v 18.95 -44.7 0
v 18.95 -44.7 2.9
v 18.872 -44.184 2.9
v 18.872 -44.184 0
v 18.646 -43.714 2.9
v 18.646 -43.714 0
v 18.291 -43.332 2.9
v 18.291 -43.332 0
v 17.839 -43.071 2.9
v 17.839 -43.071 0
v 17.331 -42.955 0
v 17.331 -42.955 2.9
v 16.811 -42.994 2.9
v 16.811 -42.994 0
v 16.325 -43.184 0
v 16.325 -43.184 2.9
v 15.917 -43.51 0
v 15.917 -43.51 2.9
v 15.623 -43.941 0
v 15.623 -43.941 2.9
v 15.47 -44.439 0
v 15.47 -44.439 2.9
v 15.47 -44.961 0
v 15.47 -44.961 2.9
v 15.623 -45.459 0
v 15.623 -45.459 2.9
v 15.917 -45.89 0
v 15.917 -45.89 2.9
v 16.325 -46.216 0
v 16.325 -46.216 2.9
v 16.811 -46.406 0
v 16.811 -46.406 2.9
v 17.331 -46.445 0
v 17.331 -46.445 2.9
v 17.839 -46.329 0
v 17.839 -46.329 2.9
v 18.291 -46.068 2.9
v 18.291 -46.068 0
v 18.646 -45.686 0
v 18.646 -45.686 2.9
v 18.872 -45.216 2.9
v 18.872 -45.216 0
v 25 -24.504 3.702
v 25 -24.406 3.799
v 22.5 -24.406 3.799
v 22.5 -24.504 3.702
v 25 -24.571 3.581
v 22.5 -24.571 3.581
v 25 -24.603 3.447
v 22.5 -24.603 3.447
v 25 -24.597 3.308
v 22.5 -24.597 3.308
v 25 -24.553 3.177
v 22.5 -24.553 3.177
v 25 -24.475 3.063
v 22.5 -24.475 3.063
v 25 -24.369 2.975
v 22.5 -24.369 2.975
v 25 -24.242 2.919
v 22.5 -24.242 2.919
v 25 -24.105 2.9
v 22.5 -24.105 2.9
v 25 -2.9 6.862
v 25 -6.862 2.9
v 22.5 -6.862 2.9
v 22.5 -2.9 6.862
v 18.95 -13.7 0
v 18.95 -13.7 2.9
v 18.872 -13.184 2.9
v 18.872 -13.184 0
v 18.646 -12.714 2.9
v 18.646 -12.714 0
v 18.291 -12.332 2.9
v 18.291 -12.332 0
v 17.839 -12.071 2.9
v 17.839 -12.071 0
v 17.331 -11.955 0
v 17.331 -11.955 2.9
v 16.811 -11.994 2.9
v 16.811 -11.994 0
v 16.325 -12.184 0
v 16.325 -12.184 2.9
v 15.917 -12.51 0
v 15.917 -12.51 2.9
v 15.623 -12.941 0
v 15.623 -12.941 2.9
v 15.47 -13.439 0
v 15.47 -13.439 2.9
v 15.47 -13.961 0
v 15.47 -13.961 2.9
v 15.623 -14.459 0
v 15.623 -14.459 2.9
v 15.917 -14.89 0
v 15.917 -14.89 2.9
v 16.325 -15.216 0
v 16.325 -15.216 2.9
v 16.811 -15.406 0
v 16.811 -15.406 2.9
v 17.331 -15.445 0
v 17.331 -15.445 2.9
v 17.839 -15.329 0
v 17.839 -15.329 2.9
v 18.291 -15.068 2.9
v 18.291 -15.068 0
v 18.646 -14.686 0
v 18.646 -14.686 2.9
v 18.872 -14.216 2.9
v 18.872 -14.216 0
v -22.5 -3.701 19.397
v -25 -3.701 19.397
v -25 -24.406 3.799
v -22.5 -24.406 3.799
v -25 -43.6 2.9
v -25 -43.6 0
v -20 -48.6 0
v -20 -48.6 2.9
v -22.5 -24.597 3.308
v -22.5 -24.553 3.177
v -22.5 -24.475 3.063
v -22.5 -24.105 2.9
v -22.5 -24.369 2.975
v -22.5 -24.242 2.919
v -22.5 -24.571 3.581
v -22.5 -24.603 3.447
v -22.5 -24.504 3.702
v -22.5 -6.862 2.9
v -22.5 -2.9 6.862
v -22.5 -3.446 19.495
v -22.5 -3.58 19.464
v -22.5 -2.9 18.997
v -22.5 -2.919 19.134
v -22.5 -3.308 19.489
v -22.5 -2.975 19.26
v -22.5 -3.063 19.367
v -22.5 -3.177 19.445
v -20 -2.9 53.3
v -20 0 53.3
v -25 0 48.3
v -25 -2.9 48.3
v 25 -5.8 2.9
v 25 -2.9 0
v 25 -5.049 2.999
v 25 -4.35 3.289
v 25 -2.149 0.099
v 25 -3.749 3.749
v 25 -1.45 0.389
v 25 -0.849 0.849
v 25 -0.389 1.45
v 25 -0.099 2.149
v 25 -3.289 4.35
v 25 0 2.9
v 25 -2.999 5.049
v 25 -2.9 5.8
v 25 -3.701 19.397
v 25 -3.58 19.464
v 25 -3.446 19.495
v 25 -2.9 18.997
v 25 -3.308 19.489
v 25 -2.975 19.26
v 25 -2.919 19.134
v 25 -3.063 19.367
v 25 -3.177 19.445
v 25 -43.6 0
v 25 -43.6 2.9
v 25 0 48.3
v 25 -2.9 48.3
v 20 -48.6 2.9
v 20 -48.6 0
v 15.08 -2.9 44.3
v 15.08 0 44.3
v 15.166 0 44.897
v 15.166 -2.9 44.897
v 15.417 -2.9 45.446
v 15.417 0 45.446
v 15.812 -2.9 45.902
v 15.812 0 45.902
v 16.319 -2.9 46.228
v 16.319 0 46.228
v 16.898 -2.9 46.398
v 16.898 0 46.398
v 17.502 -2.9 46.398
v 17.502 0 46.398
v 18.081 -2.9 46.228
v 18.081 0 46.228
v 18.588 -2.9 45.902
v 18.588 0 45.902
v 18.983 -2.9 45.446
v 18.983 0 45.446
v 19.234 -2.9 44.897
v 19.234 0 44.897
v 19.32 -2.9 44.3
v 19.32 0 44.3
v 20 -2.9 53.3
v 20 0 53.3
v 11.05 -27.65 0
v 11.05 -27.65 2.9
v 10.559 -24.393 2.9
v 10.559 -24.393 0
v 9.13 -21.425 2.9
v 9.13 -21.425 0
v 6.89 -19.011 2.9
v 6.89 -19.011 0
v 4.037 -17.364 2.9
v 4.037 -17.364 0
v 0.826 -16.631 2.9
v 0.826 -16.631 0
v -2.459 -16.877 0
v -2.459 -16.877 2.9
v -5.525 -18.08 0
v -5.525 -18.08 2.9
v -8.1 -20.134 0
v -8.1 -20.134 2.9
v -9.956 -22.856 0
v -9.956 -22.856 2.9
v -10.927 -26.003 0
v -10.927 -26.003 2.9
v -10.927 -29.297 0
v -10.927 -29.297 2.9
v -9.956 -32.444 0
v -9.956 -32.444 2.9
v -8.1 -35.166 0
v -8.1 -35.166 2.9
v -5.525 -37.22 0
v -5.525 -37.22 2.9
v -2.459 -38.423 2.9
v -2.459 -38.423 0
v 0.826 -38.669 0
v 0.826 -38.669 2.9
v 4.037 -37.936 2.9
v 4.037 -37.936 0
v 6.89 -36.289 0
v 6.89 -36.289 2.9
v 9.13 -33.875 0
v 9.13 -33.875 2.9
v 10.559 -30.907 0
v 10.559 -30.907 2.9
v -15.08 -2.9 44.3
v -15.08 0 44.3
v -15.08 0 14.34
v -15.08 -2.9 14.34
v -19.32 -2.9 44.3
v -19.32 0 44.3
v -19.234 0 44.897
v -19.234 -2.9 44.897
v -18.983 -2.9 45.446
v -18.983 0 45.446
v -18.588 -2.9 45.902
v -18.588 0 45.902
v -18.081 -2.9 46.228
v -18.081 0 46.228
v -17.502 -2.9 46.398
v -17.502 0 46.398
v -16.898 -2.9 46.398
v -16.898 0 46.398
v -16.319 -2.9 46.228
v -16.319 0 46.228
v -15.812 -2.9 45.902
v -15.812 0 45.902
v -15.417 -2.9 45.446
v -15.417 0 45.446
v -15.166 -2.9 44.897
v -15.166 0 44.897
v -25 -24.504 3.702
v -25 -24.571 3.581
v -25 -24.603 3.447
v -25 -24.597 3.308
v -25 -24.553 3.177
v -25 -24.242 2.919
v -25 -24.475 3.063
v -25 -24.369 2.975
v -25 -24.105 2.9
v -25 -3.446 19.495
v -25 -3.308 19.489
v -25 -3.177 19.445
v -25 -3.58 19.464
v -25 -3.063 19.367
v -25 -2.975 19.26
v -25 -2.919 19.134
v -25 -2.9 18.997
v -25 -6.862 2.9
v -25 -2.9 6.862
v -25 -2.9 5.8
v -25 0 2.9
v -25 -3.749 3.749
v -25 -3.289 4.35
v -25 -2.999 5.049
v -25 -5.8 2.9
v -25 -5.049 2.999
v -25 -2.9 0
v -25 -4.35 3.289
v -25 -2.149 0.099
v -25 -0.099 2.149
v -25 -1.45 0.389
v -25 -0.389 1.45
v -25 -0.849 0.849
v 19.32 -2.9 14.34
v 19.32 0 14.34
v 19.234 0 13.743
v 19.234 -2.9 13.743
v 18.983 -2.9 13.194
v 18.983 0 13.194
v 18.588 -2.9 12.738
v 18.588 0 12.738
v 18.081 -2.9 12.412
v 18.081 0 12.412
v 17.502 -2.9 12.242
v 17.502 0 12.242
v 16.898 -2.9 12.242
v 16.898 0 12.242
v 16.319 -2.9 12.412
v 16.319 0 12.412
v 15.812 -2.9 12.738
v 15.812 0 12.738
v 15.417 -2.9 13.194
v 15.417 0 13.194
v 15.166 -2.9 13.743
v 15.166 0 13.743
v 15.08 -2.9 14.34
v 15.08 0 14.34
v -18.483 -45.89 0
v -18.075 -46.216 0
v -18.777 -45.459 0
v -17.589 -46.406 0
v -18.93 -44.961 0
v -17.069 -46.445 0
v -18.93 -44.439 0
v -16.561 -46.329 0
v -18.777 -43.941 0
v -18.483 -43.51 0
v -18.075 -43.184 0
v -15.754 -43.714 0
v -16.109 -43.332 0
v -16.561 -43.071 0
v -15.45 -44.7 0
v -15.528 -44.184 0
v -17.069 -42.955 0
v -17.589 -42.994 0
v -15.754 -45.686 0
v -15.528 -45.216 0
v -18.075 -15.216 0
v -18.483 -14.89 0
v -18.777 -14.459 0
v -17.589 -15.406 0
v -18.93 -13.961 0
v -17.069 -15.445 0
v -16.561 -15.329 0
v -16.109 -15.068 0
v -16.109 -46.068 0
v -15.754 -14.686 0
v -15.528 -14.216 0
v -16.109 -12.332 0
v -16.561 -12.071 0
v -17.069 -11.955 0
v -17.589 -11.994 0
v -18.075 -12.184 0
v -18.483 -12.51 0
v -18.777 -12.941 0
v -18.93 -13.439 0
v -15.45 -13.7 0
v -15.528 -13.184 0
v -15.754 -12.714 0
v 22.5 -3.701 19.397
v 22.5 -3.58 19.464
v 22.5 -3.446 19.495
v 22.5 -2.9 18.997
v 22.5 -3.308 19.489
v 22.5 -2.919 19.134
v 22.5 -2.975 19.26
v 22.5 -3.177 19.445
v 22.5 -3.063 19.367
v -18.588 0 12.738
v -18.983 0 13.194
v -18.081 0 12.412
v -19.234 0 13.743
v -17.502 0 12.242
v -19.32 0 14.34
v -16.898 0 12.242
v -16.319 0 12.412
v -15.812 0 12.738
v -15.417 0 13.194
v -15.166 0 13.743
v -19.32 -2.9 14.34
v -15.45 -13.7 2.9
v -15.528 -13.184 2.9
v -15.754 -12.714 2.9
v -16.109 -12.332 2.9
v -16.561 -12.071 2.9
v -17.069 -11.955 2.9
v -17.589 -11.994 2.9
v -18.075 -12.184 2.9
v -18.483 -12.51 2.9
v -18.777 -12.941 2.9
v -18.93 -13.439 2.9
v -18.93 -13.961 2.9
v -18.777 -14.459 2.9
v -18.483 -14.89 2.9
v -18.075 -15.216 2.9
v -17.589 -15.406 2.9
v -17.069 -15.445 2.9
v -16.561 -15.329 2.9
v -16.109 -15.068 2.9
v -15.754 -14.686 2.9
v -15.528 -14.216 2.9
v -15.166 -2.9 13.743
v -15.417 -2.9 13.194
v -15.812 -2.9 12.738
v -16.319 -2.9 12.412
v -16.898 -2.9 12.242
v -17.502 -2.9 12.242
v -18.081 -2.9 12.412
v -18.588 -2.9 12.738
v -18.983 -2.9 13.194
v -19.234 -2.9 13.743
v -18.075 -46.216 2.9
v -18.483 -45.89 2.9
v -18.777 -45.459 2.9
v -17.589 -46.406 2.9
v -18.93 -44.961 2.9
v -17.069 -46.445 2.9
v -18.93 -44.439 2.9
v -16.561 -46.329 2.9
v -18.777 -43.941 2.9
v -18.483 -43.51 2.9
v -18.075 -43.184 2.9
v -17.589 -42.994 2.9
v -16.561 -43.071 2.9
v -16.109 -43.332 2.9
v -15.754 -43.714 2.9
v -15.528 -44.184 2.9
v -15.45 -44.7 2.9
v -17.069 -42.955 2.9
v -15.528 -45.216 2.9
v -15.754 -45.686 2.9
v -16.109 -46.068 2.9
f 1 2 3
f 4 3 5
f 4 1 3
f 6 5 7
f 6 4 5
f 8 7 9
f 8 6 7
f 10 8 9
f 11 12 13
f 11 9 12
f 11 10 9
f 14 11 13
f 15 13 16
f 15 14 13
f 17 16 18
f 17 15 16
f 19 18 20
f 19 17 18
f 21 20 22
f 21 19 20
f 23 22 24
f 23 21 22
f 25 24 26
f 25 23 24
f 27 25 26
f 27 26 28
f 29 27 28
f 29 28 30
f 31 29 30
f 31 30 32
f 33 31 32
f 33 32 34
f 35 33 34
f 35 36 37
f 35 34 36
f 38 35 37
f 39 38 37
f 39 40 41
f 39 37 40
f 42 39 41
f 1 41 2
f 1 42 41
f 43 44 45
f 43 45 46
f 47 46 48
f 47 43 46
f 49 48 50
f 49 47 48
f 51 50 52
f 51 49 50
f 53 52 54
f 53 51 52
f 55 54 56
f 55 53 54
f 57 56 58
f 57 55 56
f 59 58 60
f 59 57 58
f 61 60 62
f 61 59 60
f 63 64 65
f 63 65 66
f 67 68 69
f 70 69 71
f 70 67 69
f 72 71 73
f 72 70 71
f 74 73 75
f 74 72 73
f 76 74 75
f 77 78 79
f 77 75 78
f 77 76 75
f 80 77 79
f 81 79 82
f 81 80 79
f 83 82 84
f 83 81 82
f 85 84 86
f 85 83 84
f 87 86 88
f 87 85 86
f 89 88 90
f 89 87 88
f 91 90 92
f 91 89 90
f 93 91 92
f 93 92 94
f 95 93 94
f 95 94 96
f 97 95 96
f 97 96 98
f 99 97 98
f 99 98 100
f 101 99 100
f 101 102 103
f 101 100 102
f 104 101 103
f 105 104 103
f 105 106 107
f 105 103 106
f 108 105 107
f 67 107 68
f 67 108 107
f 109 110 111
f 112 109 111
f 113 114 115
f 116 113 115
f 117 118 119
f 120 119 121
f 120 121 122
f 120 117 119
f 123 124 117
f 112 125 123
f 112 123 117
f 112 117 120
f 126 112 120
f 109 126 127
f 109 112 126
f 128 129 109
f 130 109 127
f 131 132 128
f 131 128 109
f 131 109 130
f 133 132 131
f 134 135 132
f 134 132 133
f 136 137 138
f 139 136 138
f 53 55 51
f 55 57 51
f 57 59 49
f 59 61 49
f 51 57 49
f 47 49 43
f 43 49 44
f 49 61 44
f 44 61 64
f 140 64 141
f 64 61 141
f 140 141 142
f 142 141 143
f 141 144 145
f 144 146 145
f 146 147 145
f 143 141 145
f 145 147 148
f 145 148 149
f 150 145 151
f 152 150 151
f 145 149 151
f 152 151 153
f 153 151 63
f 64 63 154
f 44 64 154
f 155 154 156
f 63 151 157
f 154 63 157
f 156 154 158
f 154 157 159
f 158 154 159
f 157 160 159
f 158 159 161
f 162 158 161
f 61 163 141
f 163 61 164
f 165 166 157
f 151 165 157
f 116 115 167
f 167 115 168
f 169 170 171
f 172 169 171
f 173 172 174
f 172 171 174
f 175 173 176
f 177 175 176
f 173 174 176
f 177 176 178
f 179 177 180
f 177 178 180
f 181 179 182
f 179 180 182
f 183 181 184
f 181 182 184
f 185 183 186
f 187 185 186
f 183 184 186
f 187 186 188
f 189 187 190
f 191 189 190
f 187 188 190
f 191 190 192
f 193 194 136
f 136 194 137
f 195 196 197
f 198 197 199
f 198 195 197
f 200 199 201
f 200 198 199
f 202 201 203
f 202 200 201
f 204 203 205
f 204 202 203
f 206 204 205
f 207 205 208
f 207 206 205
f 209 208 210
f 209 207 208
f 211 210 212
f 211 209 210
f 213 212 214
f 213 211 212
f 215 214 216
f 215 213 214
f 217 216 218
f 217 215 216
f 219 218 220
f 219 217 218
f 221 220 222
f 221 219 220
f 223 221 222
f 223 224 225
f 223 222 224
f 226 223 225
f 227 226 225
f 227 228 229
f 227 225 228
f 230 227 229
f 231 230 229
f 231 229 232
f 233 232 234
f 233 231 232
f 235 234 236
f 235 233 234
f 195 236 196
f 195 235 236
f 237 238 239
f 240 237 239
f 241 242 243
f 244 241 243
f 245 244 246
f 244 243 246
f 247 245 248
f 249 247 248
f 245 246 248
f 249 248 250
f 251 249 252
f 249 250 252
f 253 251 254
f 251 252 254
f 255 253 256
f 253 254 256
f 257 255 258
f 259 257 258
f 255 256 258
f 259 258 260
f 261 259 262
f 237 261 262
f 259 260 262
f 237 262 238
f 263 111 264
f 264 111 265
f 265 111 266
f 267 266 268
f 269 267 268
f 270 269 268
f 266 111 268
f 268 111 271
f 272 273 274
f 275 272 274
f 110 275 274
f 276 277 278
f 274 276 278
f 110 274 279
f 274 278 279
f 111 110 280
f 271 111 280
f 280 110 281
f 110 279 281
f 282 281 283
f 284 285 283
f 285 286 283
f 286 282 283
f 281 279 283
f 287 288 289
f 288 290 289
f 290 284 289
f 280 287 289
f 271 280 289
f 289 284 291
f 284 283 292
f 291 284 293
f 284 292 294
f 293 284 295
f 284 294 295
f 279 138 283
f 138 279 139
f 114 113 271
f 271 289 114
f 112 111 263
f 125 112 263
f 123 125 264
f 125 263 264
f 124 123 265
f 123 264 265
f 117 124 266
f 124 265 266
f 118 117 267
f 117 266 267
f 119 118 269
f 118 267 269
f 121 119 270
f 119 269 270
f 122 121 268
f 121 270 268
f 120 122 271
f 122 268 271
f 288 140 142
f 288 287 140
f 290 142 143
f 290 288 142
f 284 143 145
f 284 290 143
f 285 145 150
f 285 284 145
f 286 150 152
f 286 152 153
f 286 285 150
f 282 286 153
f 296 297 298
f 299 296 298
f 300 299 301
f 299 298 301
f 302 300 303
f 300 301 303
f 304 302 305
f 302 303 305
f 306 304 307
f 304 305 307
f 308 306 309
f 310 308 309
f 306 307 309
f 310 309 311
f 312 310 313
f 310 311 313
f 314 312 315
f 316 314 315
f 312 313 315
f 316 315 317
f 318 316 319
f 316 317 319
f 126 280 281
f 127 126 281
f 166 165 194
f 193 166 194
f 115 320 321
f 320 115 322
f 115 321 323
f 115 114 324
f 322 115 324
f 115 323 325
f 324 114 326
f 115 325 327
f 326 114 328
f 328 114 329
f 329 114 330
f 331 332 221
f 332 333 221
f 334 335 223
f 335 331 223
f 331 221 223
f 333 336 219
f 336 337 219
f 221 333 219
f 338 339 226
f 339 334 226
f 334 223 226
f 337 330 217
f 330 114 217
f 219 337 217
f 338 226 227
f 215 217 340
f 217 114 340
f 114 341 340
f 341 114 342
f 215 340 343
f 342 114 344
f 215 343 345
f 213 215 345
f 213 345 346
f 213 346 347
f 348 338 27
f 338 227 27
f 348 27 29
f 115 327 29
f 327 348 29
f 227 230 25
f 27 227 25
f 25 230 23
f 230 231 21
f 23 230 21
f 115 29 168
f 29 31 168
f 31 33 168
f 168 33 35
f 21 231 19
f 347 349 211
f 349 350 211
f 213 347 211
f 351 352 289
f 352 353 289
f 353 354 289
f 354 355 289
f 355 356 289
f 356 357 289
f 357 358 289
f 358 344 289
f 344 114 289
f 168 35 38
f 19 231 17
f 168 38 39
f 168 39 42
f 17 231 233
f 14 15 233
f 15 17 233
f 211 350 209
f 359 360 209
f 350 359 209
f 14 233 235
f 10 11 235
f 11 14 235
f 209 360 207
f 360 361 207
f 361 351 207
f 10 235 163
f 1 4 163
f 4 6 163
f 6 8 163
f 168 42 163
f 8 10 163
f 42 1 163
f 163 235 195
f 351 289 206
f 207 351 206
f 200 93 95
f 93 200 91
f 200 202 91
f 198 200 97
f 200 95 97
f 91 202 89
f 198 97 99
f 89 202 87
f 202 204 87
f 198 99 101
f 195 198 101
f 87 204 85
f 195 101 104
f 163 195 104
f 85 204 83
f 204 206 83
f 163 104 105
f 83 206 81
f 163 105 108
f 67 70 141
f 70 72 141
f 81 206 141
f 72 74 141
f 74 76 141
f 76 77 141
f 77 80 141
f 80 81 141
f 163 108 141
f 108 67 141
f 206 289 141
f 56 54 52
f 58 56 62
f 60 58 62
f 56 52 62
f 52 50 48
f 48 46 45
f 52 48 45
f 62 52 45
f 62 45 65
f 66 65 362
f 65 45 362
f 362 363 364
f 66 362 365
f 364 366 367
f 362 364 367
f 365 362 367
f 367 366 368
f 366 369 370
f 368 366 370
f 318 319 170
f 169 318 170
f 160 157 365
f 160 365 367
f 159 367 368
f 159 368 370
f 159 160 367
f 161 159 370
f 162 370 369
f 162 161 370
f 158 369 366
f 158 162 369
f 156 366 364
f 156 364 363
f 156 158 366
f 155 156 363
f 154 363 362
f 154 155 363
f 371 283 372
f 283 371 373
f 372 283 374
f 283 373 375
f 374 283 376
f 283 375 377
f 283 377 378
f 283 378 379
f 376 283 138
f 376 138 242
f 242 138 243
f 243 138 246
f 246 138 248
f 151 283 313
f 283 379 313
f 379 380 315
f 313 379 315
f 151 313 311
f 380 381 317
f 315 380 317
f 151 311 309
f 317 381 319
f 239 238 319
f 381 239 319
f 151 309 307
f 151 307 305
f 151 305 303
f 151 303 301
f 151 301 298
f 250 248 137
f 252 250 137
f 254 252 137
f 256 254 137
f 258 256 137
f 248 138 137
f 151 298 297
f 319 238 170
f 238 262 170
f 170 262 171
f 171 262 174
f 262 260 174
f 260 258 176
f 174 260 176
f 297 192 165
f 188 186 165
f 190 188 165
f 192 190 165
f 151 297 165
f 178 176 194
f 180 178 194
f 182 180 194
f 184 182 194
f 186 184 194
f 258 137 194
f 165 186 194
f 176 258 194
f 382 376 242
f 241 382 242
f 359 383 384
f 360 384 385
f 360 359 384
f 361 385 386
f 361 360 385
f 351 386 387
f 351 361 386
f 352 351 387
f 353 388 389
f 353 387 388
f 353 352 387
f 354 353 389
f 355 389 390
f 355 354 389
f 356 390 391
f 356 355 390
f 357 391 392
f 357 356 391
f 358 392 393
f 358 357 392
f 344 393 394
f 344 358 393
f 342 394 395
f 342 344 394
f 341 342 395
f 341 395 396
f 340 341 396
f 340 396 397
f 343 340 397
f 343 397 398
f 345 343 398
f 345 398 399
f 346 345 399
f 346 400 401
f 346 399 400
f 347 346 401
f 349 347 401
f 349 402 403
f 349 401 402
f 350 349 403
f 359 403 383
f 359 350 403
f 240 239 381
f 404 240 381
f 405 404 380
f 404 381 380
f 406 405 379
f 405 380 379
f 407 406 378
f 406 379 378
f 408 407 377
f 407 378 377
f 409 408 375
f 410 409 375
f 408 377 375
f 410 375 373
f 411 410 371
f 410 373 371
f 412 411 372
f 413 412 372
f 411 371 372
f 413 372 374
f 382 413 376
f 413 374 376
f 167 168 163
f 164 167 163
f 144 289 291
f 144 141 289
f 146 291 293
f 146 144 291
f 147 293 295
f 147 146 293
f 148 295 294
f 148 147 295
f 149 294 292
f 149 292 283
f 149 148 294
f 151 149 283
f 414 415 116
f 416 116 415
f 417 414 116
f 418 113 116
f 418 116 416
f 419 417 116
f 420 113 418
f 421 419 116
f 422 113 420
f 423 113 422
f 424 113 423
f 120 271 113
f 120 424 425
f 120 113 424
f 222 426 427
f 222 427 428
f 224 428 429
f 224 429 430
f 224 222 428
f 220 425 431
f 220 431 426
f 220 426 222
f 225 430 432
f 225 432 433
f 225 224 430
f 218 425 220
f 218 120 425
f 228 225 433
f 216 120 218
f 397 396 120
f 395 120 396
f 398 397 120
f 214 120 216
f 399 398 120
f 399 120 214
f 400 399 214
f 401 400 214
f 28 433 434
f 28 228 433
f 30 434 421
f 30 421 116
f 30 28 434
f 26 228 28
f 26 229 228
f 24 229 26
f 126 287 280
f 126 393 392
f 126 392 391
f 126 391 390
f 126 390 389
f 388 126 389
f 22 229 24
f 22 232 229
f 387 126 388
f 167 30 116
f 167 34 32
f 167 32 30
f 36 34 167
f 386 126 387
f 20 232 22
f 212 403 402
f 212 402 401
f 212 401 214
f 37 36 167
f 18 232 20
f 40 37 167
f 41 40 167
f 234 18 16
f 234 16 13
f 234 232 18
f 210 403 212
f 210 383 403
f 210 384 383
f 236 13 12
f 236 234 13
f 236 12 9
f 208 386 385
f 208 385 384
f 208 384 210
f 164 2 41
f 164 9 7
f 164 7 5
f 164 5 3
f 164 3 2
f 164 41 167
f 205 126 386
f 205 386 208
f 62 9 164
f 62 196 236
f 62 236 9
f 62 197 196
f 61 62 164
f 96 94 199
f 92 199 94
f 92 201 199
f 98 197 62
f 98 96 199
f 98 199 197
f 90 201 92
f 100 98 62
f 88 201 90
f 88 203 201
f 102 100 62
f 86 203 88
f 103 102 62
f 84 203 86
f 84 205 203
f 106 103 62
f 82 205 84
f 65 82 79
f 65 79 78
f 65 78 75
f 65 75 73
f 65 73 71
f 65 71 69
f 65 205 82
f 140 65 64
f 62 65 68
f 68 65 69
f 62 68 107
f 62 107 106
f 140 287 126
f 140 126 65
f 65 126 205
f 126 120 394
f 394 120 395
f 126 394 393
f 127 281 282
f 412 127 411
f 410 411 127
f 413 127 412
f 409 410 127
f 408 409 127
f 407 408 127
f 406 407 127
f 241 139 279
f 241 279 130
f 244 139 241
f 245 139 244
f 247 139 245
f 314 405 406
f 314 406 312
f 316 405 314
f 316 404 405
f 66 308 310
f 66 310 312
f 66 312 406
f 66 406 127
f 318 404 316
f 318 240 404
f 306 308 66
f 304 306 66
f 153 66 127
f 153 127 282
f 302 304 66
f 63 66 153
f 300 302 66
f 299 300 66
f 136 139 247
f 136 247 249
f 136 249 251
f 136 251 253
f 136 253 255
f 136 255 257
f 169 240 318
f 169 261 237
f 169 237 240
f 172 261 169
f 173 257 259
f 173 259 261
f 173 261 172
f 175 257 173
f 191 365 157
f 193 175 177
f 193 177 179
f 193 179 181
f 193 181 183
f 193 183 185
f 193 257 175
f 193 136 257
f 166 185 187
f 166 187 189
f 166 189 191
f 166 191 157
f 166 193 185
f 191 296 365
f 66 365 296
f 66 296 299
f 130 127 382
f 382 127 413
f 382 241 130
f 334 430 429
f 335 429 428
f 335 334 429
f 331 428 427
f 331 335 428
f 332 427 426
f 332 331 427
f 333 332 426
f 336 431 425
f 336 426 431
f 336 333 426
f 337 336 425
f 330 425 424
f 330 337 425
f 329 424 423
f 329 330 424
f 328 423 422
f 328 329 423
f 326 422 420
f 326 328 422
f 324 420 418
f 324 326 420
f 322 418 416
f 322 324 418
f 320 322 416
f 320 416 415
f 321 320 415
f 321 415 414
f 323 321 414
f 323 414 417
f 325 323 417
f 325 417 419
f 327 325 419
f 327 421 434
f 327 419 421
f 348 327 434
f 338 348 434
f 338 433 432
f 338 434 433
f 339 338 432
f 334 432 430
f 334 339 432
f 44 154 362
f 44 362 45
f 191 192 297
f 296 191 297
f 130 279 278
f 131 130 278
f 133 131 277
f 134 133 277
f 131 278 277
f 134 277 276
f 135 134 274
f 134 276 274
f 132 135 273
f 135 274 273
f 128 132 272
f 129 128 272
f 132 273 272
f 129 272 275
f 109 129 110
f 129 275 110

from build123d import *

# Parameters (mm, degrees)
F1_DEPTH = 2.9
F2_R     = 1.75
F2_R_2   = 11.05
F3_DEPTH = 2.9
F4_R     = 2.9
F7_DEPTH = 2.5


with BuildPart() as f1:
    # F0 (on Front) → F1 (new body)
    with BuildSketch(Plane.XZ):
        Polygon((-25, 48.3), (-25, 0), (25, 0), (25, 48.3), (20, 53.3), (-20, 53.3), align=None)
        with BuildLine():
            ThreePointArc((-19.32, 44.3), (-17.2, 46.42), (-15.08, 44.3))
            Line((-15.08, 44.3), (-15.08, 14.34))
            ThreePointArc((-15.08, 14.34), (-17.2, 12.22), (-19.32, 14.34))
            Line((-19.32, 14.34), (-19.32, 44.3))
        make_face(mode=Mode.SUBTRACT)
        with BuildLine():
            ThreePointArc((15.08, 44.3), (17.2, 46.42), (19.32, 44.3))
            Line((19.32, 44.3), (19.32, 14.34))
            ThreePointArc((19.32, 14.34), (17.2, 12.22), (15.08, 14.34))
            Line((15.08, 14.34), (15.08, 44.3))
        make_face(mode=Mode.SUBTRACT)
    extrude(amount=F1_DEPTH)

    # F2 (on Top) → F3 (join)
    with BuildSketch(Plane.XY):
        Polygon((25, 0), (-25, 0), (-25, -43.6), (-20, -48.6), (20, -48.6), (25, -43.6), align=None)
        with Locations((-17.2, -44.7)):
            Circle(F2_R, mode=Mode.SUBTRACT)
        with Locations((17.2, -44.7)):
            Circle(F2_R, mode=Mode.SUBTRACT)
        with Locations((0, -27.65)):
            Circle(F2_R_2, mode=Mode.SUBTRACT)
        with Locations((-17.2, -13.7)):
            Circle(F2_R, mode=Mode.SUBTRACT)
        with Locations((17.2, -13.7)):
            Circle(F2_R, mode=Mode.SUBTRACT)
    extrude(amount=F3_DEPTH)

    # F4
    f4_edges = [f1.edges().sort_by_distance(p)[0] for p in [
        (0, -2.9, 2.9),
        (0, 0, 0),
    ]]
    fillet(f4_edges, radius=F4_R)

    # F6 (on offset) → F7 (join)
    with BuildSketch(Plane.YZ.offset(25)):
        with BuildLine():
            Line((-3.700844, 19.396721), (-24.406105, 3.799366))
            ThreePointArc((-24.406105, 3.799366), (-24.579436, 3.241385), (-24.105261, 2.9))
            Line((-24.105261, 2.9), (-6.861522, 2.9))
            Line((-6.861522, 2.9), (-2.9, 6.861522))
            Line((-2.9, 6.861522), (-2.9, 18.997355))
            ThreePointArc((-2.9, 18.997355), (-3.176865, 19.444805), (-3.700844, 19.396721))
        make_face()
    extrude(amount=-F7_DEPTH)

    # F8: F1 across plane


with BuildPart() as f1_1:
    add(f1.part)
    add(f1.part.mirror(Plane.YZ))


solid = f1_1.part
